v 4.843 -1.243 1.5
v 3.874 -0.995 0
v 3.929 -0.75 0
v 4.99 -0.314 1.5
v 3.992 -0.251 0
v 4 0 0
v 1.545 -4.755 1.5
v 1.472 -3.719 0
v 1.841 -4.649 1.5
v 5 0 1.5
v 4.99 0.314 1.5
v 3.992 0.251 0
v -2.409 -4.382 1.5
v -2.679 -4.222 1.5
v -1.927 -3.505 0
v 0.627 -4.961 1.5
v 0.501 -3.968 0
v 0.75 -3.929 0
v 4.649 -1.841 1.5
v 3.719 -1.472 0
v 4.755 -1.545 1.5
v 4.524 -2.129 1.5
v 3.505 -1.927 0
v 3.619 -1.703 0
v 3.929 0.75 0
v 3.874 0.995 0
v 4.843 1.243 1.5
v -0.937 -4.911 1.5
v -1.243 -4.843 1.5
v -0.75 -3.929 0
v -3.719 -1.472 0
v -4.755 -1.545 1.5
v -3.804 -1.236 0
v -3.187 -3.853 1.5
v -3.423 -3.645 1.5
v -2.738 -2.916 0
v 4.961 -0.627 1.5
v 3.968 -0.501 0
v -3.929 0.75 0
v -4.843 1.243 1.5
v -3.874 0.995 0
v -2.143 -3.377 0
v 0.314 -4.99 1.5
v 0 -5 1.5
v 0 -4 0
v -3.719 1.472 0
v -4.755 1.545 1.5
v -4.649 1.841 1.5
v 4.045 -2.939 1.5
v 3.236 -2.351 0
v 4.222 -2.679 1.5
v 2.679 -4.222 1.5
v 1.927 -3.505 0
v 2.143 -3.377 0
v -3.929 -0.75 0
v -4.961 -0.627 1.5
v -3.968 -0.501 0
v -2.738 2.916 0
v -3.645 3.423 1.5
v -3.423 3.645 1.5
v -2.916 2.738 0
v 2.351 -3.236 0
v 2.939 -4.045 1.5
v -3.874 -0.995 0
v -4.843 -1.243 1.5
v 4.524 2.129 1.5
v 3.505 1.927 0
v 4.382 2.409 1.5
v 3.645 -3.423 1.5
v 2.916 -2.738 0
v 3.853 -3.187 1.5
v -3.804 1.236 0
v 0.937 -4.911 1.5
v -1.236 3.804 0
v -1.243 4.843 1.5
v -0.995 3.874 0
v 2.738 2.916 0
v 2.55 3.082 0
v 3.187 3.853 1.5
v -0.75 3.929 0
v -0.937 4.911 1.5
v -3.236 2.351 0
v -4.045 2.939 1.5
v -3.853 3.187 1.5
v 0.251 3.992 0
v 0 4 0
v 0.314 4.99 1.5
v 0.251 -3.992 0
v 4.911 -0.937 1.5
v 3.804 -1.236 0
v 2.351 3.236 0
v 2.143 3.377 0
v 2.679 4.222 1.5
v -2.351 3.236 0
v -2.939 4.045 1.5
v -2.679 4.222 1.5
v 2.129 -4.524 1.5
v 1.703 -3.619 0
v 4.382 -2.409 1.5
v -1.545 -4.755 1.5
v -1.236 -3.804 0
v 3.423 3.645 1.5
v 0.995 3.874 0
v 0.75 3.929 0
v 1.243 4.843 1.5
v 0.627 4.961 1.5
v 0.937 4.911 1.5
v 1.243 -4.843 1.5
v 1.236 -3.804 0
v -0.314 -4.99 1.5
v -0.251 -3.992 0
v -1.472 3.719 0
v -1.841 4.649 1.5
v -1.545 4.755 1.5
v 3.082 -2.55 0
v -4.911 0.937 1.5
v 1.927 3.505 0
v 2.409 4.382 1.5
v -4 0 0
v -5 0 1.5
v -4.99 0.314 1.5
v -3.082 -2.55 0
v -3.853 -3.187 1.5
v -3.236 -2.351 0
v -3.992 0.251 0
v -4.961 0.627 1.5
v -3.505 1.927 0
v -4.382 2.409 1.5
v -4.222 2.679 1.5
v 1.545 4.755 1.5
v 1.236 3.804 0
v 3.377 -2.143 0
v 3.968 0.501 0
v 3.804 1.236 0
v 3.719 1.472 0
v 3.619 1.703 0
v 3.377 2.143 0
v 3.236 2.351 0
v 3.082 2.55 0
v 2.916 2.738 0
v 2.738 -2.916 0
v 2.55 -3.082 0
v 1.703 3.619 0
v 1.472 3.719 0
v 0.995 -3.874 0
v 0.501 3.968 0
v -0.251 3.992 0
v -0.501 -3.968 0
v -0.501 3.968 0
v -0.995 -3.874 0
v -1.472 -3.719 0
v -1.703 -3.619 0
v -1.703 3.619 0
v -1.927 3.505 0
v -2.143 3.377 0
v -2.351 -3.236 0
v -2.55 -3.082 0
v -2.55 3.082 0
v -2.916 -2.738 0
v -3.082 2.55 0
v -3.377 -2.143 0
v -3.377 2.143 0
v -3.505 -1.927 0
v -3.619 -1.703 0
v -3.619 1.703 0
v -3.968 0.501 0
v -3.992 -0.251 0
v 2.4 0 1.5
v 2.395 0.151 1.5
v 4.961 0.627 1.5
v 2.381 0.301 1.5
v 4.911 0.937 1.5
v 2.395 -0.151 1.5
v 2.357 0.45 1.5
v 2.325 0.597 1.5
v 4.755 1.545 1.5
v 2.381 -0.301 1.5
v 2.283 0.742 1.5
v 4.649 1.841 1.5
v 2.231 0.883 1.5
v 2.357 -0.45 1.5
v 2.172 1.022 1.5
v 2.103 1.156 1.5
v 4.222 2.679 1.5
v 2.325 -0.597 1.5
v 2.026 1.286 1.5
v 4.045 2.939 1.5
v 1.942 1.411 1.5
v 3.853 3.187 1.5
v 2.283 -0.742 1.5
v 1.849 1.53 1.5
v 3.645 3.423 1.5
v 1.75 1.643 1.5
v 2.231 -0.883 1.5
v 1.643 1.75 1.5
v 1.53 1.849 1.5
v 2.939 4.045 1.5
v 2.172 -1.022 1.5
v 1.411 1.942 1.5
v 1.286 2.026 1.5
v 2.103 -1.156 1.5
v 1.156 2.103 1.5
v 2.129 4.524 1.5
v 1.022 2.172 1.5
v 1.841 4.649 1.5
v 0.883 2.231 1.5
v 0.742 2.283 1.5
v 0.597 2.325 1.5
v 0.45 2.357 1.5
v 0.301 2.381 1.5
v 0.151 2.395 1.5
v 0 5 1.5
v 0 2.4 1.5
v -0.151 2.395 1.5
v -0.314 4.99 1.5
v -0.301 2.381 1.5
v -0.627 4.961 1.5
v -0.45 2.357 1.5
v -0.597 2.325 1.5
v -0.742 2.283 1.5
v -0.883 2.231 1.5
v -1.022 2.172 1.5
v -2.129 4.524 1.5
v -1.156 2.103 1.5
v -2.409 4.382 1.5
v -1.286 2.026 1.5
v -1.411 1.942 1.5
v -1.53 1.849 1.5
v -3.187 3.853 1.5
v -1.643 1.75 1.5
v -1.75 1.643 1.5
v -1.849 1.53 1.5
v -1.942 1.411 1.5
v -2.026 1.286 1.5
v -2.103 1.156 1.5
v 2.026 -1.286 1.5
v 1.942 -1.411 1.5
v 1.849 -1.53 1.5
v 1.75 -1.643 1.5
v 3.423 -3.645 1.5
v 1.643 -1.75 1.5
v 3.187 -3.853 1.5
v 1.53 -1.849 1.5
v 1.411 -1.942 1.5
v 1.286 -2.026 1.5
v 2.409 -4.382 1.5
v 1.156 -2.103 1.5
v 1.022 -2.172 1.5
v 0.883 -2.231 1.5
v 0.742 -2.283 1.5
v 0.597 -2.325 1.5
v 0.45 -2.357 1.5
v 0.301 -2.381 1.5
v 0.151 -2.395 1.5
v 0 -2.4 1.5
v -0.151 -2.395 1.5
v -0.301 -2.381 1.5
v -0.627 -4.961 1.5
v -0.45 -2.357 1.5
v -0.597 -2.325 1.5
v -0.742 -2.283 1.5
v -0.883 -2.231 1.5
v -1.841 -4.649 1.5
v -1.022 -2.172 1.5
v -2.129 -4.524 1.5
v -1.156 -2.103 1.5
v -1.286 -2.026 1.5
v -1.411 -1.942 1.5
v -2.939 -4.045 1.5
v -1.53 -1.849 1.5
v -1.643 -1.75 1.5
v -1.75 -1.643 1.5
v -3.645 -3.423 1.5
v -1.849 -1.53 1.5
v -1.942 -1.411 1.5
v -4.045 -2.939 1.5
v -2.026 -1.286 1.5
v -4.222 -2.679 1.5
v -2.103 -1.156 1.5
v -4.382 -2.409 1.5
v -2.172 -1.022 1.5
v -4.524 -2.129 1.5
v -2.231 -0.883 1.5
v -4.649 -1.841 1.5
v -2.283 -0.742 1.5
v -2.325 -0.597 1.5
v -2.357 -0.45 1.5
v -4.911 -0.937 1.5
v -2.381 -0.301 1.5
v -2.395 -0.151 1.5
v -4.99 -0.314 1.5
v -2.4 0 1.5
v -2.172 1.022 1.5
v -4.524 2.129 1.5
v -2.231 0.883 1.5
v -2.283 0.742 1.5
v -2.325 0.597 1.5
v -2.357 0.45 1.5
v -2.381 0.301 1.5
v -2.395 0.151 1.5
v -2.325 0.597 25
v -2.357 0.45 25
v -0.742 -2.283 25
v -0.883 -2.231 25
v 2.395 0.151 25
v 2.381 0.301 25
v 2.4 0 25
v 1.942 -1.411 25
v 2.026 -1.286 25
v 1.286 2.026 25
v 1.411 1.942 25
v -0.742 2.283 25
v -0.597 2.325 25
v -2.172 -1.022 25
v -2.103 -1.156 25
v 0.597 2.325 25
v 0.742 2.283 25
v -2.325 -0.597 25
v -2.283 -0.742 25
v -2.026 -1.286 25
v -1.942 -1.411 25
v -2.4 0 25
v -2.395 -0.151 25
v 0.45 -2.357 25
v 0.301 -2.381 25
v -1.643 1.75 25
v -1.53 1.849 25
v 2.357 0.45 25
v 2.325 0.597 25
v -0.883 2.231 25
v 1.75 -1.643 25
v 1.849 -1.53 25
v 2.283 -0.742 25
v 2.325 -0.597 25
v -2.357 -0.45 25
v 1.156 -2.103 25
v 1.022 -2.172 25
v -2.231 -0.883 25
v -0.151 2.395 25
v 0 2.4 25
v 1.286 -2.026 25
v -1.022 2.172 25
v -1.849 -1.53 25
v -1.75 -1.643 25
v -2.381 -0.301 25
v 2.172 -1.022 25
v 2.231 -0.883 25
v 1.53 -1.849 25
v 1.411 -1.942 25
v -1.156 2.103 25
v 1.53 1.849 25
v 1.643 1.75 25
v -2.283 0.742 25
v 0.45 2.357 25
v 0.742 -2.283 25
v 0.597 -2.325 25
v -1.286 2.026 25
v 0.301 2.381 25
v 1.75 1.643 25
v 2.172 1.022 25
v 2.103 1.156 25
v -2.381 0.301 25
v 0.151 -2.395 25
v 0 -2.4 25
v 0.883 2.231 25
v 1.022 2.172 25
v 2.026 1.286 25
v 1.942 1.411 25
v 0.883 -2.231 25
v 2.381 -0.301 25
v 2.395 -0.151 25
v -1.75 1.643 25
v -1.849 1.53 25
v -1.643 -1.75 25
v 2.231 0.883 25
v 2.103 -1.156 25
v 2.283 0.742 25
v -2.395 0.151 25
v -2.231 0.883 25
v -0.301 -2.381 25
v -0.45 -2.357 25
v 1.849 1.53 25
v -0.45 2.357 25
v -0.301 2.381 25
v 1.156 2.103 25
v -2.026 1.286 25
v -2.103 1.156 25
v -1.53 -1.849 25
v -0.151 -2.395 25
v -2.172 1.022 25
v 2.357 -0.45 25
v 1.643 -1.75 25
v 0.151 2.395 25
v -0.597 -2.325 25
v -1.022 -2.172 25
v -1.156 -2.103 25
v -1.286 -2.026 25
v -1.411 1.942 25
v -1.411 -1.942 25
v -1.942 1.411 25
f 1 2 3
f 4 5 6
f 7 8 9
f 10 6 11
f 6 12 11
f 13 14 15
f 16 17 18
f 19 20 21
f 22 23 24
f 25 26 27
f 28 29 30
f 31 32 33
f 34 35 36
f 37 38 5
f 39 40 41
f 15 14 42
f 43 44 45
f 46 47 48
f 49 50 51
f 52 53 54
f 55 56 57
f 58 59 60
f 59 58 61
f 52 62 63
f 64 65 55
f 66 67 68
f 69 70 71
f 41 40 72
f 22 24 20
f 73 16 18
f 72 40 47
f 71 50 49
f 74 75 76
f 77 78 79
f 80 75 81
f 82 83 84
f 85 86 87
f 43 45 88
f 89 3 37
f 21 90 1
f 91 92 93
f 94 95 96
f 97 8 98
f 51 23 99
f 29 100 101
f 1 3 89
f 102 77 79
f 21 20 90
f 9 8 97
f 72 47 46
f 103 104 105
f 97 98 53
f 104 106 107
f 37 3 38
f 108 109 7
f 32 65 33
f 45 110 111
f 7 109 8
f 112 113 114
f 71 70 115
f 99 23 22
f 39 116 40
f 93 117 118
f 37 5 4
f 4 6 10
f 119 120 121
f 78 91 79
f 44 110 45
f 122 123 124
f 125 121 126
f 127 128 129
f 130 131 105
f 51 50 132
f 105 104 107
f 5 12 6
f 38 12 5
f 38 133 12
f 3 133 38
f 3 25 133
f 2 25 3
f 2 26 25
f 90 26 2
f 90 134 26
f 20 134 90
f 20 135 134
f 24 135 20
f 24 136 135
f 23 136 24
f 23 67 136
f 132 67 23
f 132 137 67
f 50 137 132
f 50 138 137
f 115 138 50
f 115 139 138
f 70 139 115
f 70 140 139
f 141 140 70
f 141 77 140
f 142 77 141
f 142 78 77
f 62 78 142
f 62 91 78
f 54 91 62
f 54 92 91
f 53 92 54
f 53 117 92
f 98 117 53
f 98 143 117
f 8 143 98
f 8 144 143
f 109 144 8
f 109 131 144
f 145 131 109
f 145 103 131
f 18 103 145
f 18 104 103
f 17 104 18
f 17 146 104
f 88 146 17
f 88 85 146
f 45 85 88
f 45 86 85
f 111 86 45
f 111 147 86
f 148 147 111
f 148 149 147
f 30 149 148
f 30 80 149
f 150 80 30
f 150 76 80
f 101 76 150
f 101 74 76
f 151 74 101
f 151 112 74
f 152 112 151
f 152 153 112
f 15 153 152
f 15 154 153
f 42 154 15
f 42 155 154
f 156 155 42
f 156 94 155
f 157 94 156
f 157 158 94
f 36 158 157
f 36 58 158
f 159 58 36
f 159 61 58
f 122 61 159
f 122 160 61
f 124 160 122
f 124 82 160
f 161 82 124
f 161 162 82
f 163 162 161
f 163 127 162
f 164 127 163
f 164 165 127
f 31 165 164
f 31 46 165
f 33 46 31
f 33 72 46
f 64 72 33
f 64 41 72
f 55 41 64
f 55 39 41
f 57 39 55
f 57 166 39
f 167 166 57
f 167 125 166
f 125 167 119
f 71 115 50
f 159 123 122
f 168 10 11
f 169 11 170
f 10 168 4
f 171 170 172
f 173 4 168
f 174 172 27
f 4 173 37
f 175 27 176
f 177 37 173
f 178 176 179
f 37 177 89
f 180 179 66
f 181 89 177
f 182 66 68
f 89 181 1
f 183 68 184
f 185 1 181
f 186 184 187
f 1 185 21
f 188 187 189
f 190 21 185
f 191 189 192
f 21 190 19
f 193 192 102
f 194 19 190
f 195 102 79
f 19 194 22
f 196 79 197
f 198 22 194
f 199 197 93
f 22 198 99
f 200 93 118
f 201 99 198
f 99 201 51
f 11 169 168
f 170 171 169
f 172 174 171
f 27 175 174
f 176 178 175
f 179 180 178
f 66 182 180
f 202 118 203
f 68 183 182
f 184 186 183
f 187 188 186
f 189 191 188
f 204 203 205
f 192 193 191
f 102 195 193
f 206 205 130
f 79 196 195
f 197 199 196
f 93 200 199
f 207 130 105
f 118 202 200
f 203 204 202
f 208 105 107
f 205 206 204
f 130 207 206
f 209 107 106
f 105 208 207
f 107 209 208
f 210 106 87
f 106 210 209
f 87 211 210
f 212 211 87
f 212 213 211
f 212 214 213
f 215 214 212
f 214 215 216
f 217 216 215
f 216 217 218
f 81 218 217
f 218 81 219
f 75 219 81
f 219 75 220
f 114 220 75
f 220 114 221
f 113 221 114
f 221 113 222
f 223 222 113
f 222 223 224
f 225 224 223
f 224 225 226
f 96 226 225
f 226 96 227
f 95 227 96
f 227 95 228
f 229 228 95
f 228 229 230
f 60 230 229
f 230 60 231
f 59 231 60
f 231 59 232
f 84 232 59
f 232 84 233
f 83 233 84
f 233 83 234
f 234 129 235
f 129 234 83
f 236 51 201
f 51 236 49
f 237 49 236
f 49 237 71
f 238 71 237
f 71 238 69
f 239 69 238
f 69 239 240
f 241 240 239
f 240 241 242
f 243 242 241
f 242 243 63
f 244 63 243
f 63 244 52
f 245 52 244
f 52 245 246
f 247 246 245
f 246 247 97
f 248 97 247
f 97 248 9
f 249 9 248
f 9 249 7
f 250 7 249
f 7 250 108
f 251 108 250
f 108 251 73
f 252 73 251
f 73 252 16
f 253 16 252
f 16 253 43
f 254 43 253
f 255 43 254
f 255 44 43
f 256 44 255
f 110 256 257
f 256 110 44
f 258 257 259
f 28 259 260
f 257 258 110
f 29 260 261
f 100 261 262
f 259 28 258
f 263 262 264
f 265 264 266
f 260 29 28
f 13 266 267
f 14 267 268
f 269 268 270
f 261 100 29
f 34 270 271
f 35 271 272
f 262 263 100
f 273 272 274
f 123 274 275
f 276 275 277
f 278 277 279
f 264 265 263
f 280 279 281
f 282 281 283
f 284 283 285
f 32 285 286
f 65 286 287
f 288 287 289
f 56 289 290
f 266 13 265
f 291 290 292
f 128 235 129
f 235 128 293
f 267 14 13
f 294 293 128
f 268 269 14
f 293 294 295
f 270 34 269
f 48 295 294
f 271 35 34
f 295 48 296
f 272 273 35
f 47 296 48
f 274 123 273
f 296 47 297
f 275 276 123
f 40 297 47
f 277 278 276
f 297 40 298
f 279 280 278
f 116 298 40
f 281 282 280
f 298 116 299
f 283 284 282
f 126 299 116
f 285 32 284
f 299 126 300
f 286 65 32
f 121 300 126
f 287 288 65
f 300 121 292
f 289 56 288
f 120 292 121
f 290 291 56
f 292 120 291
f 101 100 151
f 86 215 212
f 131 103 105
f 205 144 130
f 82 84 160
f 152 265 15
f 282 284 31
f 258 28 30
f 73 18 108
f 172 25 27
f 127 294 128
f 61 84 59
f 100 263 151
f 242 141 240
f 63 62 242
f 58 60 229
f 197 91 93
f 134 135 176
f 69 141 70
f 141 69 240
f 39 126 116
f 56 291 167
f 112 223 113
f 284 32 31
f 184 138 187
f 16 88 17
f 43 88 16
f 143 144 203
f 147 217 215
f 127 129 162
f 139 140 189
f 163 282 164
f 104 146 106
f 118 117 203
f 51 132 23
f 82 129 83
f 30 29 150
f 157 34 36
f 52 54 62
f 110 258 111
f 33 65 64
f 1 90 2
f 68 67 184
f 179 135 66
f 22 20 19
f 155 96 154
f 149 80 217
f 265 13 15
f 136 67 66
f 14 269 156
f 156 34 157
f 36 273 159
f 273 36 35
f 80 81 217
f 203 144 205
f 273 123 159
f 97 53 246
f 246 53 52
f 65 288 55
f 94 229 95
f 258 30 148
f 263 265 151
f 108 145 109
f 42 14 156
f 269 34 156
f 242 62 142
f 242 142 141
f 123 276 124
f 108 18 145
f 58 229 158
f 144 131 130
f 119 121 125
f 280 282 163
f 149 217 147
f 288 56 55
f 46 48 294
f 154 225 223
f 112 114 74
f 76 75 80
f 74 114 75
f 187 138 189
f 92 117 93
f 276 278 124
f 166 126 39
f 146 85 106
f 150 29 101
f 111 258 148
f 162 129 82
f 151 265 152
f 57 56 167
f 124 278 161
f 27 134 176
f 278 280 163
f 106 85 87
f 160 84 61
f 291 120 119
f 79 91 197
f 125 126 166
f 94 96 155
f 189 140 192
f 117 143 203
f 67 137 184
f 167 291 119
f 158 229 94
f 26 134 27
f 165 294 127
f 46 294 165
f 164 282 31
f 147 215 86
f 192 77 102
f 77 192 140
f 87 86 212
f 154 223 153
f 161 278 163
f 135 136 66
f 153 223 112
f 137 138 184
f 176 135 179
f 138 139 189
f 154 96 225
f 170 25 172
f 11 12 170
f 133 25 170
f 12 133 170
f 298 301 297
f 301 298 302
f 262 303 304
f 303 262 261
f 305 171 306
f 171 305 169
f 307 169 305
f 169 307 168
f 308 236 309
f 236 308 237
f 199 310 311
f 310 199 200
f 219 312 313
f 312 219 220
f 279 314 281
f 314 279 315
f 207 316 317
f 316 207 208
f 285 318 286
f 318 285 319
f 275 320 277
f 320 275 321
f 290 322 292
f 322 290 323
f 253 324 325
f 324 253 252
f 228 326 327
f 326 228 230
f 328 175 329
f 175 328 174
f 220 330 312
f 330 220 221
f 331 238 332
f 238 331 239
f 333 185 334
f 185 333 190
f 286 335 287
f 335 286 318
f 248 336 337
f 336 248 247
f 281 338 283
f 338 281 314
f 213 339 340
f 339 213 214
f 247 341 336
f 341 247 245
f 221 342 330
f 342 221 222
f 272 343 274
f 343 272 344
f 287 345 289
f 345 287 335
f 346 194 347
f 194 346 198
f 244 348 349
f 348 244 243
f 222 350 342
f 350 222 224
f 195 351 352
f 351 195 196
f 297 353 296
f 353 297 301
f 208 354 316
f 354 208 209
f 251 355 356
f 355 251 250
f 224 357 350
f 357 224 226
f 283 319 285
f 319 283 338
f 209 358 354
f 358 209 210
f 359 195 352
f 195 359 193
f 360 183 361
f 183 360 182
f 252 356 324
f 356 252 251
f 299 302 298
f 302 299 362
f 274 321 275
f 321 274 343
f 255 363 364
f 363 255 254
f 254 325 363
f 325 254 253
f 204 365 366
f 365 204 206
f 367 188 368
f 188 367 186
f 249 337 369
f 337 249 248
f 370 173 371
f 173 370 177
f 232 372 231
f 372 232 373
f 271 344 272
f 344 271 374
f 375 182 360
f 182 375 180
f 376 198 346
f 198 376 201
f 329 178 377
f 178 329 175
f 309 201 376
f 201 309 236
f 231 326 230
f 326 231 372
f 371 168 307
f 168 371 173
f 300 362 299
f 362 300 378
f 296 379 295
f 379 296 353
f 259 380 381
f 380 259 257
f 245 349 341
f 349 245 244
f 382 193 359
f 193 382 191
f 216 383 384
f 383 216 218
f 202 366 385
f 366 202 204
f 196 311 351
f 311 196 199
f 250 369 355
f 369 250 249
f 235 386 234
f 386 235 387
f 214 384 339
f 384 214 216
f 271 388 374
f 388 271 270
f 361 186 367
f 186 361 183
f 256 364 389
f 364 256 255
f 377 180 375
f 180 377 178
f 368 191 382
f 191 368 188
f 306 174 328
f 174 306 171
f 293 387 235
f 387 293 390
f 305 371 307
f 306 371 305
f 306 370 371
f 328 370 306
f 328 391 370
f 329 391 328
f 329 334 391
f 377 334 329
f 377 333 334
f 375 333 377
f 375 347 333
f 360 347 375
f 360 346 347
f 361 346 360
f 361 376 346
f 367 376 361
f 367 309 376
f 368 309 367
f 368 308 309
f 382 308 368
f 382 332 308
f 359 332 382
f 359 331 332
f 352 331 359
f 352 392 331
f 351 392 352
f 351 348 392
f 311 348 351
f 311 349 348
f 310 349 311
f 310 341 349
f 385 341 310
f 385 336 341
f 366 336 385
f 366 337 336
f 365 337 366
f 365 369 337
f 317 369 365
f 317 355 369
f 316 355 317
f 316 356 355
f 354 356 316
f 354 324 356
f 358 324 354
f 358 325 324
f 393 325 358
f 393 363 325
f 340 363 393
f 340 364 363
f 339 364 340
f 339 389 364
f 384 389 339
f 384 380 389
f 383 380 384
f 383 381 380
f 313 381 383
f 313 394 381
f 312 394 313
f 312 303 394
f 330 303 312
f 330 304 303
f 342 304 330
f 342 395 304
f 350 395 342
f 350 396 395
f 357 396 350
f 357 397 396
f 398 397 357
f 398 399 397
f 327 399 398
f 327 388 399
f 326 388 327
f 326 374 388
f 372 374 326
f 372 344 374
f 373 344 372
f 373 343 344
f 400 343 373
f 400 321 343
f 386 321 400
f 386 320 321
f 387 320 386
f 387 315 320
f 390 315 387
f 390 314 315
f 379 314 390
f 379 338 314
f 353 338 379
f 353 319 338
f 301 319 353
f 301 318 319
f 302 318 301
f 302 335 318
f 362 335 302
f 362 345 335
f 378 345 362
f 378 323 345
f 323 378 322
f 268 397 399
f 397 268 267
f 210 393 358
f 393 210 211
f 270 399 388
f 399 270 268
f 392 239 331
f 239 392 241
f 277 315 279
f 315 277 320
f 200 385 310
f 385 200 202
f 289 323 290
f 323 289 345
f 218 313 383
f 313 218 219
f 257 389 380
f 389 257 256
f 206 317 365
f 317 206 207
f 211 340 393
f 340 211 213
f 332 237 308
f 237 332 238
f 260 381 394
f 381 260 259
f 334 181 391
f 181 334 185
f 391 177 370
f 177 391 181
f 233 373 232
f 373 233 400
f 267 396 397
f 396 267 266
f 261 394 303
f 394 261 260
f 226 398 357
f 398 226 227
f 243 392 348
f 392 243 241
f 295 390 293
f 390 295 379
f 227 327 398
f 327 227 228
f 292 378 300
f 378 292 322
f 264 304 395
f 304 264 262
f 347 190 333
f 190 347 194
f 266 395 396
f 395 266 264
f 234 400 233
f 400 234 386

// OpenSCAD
$fn=100;
cylinder(1.5,4,5);
translate(1.5,0,0) {
    cylinder(25,2.4,2.4);    
}
